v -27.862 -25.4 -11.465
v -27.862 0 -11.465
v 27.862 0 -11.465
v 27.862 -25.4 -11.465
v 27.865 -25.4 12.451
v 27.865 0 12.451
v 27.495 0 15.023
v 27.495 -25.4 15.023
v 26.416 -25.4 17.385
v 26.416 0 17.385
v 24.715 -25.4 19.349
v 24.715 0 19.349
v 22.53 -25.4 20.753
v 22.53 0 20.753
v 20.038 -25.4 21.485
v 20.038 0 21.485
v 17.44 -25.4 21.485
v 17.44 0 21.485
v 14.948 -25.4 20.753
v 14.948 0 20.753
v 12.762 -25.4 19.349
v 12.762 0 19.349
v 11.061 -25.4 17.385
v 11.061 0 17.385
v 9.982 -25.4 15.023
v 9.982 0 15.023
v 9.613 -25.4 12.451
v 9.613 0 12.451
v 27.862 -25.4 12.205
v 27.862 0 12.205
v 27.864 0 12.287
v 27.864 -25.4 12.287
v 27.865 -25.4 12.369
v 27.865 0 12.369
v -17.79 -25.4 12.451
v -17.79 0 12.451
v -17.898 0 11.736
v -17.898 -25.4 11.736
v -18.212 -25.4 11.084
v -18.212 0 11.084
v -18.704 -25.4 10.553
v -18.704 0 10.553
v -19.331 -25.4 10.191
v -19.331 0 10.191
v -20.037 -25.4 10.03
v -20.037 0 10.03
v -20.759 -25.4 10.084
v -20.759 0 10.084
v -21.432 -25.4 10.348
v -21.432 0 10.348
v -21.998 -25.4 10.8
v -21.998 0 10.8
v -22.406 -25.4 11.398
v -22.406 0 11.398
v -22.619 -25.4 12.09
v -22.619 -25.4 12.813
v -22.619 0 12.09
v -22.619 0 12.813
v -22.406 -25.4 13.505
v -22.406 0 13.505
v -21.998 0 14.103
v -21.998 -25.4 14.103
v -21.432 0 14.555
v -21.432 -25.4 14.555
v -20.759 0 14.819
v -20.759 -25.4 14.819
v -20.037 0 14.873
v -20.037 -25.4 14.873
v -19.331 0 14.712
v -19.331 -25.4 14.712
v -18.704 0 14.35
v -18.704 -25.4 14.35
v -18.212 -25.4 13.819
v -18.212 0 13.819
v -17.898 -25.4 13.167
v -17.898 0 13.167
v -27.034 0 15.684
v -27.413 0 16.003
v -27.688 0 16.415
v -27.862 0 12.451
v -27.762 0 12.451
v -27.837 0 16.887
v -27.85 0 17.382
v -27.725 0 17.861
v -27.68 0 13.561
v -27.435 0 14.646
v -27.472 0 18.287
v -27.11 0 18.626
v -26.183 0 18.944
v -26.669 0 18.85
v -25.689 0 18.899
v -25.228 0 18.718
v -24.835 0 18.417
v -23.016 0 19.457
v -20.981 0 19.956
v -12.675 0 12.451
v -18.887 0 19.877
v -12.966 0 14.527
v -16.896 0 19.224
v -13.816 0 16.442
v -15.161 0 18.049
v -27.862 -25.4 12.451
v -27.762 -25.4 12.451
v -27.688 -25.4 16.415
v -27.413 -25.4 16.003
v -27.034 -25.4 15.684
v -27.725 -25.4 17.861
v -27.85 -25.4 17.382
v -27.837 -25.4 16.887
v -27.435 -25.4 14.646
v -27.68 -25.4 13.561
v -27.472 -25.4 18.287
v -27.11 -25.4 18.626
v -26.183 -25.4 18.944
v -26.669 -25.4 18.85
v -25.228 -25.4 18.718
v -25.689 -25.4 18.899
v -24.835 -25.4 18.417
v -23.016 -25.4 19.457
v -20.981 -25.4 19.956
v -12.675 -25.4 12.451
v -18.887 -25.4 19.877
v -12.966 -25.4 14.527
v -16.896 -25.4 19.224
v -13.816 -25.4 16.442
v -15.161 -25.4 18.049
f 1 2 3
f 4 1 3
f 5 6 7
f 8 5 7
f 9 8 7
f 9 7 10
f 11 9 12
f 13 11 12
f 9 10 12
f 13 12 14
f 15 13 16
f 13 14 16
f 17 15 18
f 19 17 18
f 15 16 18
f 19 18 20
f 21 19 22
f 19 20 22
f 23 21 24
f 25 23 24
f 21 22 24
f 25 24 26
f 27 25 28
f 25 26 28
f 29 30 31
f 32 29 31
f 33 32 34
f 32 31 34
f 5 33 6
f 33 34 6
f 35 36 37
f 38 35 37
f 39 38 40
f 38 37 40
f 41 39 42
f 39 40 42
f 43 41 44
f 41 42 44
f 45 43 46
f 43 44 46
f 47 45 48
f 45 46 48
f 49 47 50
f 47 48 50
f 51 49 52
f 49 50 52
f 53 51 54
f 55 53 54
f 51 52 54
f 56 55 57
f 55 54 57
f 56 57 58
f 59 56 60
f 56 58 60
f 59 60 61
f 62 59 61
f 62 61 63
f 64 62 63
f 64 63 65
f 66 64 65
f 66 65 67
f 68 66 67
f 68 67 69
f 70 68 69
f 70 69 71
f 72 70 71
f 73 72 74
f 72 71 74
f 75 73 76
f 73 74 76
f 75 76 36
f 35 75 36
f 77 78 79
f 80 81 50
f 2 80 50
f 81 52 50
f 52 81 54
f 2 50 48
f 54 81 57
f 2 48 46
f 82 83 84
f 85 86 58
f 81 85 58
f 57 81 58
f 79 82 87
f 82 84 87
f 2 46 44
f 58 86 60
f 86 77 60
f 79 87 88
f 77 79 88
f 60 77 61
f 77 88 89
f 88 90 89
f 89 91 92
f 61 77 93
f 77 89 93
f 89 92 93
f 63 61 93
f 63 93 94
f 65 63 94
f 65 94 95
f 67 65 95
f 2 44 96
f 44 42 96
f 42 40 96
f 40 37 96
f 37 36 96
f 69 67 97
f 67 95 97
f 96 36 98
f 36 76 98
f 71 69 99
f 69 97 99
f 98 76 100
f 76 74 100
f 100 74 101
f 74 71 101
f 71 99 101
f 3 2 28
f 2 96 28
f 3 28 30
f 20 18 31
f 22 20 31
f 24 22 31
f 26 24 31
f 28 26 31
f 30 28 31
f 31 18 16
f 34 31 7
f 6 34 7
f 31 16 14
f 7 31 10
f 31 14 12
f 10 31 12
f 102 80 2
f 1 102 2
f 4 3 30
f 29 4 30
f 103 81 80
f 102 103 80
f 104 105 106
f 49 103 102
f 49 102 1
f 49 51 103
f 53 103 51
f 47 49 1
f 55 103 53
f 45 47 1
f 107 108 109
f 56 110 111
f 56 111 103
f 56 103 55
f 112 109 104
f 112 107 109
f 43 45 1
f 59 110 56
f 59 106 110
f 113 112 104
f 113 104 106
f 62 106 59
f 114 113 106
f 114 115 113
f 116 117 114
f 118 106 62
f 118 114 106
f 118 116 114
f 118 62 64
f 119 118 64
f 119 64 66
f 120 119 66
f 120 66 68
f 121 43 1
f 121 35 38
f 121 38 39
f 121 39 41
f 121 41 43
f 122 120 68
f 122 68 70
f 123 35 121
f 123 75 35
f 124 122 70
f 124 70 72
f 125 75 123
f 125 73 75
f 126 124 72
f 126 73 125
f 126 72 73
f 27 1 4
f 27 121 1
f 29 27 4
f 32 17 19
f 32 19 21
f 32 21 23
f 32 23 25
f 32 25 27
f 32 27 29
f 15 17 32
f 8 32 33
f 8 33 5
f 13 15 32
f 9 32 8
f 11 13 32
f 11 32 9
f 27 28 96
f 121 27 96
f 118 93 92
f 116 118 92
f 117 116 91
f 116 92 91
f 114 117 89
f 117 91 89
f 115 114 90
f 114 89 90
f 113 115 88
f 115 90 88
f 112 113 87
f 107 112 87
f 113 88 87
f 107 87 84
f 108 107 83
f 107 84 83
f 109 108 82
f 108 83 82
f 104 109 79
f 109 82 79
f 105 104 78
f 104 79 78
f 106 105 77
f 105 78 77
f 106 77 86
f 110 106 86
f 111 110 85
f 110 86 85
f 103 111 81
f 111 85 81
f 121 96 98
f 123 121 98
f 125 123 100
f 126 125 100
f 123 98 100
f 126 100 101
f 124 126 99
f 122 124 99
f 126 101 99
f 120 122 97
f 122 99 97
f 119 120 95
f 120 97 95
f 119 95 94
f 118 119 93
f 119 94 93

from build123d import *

# Parameters (mm, degrees)
F1_DEPTH = 25.4
F3_DEPTH = 25.4


# Not quite as in the source:
# - the program builds the solid bodies; features that only make, move or delete a surface that nothing else refers to are left out


with BuildPart() as f1:
    # F0 (on Front) → F1 (new body)
    with BuildSketch(Plane.XZ):
        with BuildLine():
            Line((9.6126659133, 12.4514792114), (-12.6748333757, 12.4514792114))
            ThreePointArc((-12.6748333757, 12.4514792114), (-20.2182408326, 4.9080717545), (-27.7616482896, 12.4514792114))
            Line((-27.7616482896, 12.4514792114), (-27.861725539, 12.4514792114))
            Line((-27.861725539, 12.4514792114), (-27.861725539, -11.4652235061))
            Line((-27.861725539, -11.4652235061), (27.8617236763, -11.4652235061))
            Line((27.8617236763, -11.4652235061), (27.8617236763, 12.2047088224))
            ThreePointArc((27.8617236763, 12.2047088224), (18.6154667795, 3.3261161383), (9.6126659133, 12.4514792114))
        make_face()
        with BuildLine():
            Line((-12.6748333757, 12.4514792114), (-17.7898686341, 12.4514792114))
            ThreePointArc((-17.7898686341, 12.4514792114), (-20.2182408326, 10.0231070129), (-22.6466130312, 12.4514792114))
            Line((-22.6466130312, 12.4514792114), (-27.7616482896, 12.4514792114))
            ThreePointArc((-27.7616482896, 12.4514792114), (-20.2182408326, 4.9080717545), (-12.6748333757, 12.4514792114))
        make_face()
    extrude(amount=F1_DEPTH)

    # F0 (on Front) → F3 (join)
    with BuildSketch(Plane.XZ):
        with BuildLine():
            ThreePointArc((-22.6466130312, 12.4514792114), (-20.2182408326, 14.87985141), (-17.7898686341, 12.4514792114))
            Line((-17.7898686341, 12.4514792114), (-12.6748333757, 12.4514792114))
            ThreePointArc((-12.6748333757, 12.4514792114), (-16.8959093658, 19.2238576479), (-24.8351495055, 18.4169758688))
            ThreePointArc((-24.8351495055, 18.4169758688), (-24.460861538, 17.8481513463), (-24.3295943797, 17.1800033439))
            ThreePointArc((-24.3295943797, 17.1800033439), (-25.2407357632, 15.634657994), (-27.0340151871, 15.6838492415))
            ThreePointArc((-27.0340151871, 15.6838492415), (-27.5774921245, 14.1081072584), (-27.7616482896, 12.4514792114))
            Line((-27.7616482896, 12.4514792114), (-22.6466130312, 12.4514792114))
        make_face()
        with BuildLine():
            Line((-12.6748333757, 12.4514792114), (-17.7898686341, 12.4514792114))
            ThreePointArc((-17.7898686341, 12.4514792114), (-20.2182408326, 10.0231070129), (-22.6466130312, 12.4514792114))
            Line((-22.6466130312, 12.4514792114), (-27.7616482896, 12.4514792114))
            ThreePointArc((-27.7616482896, 12.4514792114), (-20.2182408326, 4.9080717545), (-12.6748333757, 12.4514792114))
        make_face()
        with BuildLine():
            Line((9.6126659133, 12.4514792114), (-12.6748333757, 12.4514792114))
            ThreePointArc((-12.6748333757, 12.4514792114), (-20.2182408326, 4.9080717545), (-27.7616482896, 12.4514792114))
            Line((-27.7616482896, 12.4514792114), (-27.861725539, 12.4514792114))
            Line((-27.861725539, 12.4514792114), (-27.861725539, -11.4652235061))
            Line((-27.861725539, -11.4652235061), (27.8617236763, -11.4652235061))
            Line((27.8617236763, -11.4652235061), (27.8617236763, 12.2047088224))
            ThreePointArc((27.8617236763, 12.2047088224), (18.6154667795, 3.3261161383), (9.6126659133, 12.4514792114))
        make_face()
        with BuildLine():
            ThreePointArc((27.8650605952, 12.4514792114), (18.7388632542, 21.5776765524), (9.6126659133, 12.4514792114))
            Line((9.6126659133, 12.4514792114), (27.8617236763, 12.4514792114))
            Line((27.8617236763, 12.4514792114), (27.8617236763, 12.2047088224))
            ThreePointArc((27.8617236763, 12.2047088224), (27.8642263273, 12.3280827367), (27.8650605952, 12.4514792114))
        make_face()
        with BuildLine():
            Line((27.8617236763, 12.4514792114), (9.6126659133, 12.4514792114))
            ThreePointArc((9.6126659133, 12.4514792114), (18.6154667795, 3.3261161383), (27.8617236763, 12.2047088224))
            Line((27.8617236763, 12.2047088224), (27.8617236763, 12.4514792114))
        make_face()
        with BuildLine():
            ThreePointArc((-24.3295943797, 17.1800033439), (-24.460861538, 17.8481513463), (-24.8351495055, 18.4169758688))
            ThreePointArc((-24.8351495055, 18.4169758688), (-26.0956599593, 17.1800033439), (-27.0340151871, 15.6838492415))
            ThreePointArc((-27.0340151871, 15.6838492415), (-25.2407357632, 15.634657994), (-24.3295943797, 17.1800033439))
        make_face()
        with BuildLine():
            ThreePointArc((-27.0340151871, 15.6838492415), (-26.0956599593, 17.1800033439), (-24.8351495055, 18.4169758688))
            ThreePointArc((-24.8351495055, 18.4169758688), (-27.4716836828, 18.2870473105), (-27.0340151871, 15.6838492415))
        make_face()
    extrude(amount=F3_DEPTH)


solid = f1.part
